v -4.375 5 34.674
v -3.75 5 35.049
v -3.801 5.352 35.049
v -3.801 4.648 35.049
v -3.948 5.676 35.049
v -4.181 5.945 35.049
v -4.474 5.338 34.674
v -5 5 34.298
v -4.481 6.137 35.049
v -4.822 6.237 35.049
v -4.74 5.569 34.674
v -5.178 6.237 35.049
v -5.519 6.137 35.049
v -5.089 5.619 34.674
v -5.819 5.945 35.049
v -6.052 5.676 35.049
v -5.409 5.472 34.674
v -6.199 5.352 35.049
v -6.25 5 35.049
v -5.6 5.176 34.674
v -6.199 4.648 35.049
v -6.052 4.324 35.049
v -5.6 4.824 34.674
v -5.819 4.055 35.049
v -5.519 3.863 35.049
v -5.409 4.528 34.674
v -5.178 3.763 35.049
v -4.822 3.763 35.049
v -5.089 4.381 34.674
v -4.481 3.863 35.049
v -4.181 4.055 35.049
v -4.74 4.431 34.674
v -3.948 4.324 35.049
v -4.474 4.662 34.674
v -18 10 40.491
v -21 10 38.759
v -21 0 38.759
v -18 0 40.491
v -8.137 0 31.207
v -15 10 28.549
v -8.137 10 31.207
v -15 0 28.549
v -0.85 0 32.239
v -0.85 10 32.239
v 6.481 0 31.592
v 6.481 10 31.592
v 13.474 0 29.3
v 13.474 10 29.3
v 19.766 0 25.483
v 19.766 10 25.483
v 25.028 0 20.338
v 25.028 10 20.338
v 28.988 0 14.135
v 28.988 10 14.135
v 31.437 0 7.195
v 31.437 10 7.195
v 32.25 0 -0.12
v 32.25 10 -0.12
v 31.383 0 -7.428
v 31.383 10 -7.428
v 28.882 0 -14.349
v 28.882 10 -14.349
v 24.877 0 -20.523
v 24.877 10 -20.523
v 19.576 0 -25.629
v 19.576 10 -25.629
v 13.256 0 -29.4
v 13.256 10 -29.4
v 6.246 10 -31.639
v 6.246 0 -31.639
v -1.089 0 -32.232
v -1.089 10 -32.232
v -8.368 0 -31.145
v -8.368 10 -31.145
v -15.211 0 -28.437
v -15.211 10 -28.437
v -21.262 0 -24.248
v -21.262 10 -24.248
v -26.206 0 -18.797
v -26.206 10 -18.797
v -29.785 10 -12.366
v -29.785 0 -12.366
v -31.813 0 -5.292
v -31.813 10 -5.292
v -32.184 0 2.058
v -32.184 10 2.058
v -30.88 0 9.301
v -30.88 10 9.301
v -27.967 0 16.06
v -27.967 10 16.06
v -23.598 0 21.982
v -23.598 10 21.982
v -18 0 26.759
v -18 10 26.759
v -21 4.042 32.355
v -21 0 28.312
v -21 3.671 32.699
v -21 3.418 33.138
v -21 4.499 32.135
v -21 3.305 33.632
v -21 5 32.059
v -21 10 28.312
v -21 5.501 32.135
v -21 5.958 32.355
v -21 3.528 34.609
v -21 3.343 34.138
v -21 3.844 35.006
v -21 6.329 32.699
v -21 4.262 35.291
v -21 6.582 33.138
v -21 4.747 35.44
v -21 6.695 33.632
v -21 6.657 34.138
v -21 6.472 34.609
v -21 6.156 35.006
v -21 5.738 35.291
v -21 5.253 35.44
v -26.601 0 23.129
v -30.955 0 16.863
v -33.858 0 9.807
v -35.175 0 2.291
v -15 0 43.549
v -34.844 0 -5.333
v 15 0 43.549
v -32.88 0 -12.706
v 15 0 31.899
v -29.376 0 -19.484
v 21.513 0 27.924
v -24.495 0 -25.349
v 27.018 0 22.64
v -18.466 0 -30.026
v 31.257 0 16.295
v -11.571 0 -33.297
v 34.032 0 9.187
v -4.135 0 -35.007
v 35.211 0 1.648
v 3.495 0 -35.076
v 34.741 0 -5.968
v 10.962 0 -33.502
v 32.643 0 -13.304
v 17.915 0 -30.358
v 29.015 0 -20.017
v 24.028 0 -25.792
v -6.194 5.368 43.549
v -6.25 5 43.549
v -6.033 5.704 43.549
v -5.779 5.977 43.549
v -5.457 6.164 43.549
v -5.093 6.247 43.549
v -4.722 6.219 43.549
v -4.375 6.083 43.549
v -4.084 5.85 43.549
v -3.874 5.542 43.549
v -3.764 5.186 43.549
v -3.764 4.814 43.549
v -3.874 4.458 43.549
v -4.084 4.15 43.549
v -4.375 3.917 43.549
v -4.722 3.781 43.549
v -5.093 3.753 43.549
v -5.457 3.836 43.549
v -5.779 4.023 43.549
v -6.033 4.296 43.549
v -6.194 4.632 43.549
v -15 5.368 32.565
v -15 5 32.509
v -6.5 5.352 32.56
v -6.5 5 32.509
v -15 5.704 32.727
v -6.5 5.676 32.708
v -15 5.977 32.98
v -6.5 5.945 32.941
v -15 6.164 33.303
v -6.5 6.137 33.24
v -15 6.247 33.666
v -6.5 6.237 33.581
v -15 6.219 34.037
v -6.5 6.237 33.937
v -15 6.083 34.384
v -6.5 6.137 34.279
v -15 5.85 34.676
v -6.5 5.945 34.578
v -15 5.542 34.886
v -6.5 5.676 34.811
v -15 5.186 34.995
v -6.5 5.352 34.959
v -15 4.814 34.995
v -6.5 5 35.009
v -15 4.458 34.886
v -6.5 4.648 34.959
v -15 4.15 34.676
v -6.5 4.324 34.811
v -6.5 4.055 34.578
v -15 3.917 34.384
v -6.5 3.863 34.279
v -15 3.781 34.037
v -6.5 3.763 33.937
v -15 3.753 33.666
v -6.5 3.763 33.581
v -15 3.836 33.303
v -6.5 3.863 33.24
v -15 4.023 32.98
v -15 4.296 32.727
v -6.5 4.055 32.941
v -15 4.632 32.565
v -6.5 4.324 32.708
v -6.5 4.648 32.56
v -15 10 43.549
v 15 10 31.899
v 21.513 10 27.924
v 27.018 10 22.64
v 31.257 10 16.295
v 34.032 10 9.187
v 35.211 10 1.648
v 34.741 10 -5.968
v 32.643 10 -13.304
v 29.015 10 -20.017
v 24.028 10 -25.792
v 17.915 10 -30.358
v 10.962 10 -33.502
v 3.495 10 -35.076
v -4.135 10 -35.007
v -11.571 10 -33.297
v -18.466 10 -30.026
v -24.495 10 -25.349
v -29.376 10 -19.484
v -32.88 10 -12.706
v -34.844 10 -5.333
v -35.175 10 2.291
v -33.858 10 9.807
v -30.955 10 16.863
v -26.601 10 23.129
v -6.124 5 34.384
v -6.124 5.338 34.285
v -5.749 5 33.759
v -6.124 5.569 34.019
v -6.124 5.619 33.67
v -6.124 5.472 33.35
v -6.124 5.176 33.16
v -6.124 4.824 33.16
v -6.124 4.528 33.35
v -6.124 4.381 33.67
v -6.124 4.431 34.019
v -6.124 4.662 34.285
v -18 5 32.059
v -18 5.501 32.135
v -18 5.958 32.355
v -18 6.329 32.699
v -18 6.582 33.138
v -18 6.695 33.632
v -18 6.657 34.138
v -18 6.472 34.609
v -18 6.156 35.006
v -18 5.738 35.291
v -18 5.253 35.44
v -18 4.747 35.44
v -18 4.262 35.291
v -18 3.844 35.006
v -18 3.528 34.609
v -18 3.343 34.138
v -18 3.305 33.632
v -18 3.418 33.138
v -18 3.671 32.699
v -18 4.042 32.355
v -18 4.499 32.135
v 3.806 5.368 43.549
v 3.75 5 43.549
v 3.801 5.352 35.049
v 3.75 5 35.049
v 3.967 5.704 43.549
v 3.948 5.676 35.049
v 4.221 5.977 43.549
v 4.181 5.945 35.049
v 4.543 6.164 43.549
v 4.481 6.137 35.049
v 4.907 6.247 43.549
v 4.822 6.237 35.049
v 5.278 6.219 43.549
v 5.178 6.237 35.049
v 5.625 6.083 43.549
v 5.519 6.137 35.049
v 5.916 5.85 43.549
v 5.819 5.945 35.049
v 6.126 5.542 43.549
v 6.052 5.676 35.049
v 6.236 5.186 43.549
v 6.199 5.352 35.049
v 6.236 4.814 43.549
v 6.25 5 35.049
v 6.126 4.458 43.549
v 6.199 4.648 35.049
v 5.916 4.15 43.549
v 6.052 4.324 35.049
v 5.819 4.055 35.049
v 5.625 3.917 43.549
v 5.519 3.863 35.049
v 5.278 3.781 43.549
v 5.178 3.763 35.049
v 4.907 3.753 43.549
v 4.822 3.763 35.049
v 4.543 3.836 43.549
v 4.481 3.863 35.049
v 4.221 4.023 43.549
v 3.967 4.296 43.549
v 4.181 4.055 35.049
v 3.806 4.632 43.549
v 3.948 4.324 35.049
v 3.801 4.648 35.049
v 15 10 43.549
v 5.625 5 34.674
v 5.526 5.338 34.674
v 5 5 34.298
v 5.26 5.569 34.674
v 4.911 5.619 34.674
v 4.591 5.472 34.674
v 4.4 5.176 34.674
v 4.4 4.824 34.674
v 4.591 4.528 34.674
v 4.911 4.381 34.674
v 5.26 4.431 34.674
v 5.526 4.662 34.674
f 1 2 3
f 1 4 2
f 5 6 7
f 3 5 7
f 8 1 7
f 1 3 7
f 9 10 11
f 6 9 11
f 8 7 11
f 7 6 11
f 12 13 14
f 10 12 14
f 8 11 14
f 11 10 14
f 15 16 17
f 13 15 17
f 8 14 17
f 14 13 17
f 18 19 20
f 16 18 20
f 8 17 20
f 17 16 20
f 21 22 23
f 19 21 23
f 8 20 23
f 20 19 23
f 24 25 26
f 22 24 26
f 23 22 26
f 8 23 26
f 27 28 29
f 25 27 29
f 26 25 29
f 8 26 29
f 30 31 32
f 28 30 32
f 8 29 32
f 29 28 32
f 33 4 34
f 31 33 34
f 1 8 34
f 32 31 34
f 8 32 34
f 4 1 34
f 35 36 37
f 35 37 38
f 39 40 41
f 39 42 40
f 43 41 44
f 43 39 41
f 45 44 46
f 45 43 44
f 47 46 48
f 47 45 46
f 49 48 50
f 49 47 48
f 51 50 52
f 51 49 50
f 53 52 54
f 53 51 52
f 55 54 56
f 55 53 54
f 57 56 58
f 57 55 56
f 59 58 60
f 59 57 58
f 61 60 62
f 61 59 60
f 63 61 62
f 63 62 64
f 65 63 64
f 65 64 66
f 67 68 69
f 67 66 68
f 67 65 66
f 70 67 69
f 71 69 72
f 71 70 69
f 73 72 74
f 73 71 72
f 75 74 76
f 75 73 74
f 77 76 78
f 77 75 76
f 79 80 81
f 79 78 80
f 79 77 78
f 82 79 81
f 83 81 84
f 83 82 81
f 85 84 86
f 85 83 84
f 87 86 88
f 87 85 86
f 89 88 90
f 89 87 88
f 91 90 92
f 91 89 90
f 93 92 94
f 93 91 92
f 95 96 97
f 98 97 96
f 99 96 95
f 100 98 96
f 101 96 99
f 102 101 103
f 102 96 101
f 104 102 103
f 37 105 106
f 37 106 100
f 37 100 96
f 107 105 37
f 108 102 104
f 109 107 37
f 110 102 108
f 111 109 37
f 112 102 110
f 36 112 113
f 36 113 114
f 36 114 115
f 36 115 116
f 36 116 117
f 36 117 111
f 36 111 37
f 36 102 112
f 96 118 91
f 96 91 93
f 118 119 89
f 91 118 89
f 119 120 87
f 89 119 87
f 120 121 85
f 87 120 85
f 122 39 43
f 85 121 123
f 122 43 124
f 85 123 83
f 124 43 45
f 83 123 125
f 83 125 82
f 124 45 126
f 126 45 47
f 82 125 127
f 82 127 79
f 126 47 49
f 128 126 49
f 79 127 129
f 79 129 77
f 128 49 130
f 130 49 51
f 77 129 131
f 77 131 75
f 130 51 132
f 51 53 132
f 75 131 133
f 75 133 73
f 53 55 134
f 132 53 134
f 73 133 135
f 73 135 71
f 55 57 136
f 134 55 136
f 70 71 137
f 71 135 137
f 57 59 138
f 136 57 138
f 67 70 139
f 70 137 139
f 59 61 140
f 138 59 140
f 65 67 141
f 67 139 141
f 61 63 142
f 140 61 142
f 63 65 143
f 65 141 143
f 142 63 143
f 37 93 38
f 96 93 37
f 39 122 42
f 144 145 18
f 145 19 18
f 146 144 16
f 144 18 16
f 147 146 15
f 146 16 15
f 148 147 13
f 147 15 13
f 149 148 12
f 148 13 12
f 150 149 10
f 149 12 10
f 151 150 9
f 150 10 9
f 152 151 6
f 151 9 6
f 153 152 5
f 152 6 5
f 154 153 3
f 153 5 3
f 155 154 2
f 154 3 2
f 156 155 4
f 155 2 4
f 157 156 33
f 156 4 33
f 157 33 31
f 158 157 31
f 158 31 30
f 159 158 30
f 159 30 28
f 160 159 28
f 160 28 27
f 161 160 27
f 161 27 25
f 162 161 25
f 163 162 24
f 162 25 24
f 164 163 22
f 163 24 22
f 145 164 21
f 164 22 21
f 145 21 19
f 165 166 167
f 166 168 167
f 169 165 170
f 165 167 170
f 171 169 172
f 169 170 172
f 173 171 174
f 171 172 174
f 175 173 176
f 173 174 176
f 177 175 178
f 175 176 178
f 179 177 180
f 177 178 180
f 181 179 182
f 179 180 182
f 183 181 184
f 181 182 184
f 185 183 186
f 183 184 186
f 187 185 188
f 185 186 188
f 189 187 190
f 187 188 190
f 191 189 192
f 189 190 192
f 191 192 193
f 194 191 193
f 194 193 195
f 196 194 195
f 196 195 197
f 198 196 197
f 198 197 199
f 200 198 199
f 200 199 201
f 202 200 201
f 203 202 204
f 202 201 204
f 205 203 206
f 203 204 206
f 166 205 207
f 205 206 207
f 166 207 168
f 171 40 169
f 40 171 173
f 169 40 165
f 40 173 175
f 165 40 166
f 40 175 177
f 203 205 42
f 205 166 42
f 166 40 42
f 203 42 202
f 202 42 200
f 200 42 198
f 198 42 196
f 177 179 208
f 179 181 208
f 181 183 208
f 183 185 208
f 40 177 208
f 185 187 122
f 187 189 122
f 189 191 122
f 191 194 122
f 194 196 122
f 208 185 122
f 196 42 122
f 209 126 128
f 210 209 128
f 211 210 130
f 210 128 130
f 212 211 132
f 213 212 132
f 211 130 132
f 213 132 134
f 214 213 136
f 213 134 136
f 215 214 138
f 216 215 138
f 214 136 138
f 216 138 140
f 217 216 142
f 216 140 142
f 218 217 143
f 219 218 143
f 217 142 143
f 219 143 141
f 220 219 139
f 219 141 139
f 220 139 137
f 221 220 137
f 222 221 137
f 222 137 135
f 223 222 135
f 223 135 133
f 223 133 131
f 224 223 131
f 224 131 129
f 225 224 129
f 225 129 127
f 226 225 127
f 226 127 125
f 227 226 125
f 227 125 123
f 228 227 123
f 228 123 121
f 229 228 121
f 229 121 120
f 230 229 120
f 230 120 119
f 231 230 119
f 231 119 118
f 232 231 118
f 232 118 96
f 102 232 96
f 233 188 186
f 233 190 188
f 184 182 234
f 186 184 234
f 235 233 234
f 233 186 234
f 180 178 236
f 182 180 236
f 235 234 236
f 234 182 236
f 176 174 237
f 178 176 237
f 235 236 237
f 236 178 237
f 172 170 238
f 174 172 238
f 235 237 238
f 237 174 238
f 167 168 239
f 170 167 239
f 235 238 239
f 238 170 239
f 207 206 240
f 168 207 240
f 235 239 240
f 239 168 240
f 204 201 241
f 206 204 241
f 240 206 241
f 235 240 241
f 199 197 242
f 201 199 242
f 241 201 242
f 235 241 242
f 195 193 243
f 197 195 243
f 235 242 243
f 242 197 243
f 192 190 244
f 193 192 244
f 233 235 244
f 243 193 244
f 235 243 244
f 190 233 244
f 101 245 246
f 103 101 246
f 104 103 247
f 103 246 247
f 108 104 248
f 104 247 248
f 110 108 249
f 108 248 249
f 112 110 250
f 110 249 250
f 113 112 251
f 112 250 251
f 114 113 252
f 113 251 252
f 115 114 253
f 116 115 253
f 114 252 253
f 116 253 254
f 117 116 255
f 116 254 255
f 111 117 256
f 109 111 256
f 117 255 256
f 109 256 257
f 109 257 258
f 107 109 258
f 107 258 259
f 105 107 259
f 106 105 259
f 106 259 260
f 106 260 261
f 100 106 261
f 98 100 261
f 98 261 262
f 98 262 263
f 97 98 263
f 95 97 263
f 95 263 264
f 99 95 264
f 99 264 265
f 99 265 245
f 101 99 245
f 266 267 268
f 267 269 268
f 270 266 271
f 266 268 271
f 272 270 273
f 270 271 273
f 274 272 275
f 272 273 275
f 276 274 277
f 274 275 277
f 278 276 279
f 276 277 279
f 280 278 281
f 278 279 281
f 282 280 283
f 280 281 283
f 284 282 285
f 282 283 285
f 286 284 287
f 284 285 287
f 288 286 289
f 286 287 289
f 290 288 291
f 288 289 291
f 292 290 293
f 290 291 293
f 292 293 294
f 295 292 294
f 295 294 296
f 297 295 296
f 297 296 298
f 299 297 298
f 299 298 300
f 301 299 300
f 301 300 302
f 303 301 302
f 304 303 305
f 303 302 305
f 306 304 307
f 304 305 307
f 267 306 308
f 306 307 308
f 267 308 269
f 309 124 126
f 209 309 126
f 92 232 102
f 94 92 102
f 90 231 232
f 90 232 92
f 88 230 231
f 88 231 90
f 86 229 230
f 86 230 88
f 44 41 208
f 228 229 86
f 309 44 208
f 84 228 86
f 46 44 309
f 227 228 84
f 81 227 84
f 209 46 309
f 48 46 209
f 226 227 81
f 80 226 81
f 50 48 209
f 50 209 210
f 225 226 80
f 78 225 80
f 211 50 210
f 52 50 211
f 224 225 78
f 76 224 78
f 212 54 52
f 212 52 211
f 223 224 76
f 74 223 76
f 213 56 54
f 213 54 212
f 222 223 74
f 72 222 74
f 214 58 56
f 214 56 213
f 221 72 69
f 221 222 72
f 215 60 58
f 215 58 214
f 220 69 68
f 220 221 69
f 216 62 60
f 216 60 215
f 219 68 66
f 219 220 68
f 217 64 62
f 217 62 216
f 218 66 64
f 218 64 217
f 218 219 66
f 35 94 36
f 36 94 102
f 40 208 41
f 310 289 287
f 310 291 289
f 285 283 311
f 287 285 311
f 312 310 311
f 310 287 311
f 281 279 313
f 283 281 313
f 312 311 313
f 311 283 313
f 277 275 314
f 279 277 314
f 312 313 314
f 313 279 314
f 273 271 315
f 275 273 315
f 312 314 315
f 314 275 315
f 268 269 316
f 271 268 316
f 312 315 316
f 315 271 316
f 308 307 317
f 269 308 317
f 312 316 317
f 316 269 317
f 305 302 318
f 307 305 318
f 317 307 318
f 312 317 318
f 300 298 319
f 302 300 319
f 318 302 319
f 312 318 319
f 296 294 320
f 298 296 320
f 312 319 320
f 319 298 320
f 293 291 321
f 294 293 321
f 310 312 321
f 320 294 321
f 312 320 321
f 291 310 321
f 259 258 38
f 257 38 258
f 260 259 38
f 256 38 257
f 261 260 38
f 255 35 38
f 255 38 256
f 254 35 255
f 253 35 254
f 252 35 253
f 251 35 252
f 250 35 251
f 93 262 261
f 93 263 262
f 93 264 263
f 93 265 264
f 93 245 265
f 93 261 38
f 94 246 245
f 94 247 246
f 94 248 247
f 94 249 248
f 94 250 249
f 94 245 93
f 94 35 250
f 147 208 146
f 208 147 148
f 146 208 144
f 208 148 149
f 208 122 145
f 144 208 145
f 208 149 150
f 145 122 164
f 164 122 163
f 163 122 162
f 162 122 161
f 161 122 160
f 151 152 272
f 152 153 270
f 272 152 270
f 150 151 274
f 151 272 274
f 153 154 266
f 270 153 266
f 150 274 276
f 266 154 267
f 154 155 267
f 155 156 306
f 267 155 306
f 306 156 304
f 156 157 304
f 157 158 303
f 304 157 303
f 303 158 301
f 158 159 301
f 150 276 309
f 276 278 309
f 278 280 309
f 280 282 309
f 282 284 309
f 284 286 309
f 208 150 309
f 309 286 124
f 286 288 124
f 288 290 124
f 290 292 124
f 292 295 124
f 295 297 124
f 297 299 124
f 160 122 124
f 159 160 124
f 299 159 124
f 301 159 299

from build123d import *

# Parameters (mm, degrees)
SKETCH_1_R            = 32.25
EXTRUDE_1_DEPTH       = 10
SKETCH_4_W            = 3
SKETCH_4_H            = 8.186725545
CUT_EXTRUDE_2_DEPTH   = 10
EXTRUDE_5_DEPTH       = 10
HOLE_WIZARD_M32_D     = 3.4
HOLE_WIZARD_M32_DEPTH = 3
M3X0_51_D             = 2.5
M3X0_51_DEPTH         = 8.5
M3X0_51_TIP           = 0.751075774
M3X0_52_D             = 2.5
M3X0_52_DEPTH         = 8.5
M3X0_52_TIP           = 0.751075774


with BuildPart() as part:
    # Эскиз1 → Бобышка-Вытянуть1 (new body)
    with BuildSketch(Plane(origin=(0, 0, 0), x_dir=(1, 0, 0), z_dir=(0, 1, 0))):
        with BuildLine():
            Line((-15, -31.899255477), (-15, -43.549299466))
            Line((-15, -43.549299466), (15, -43.549299466))
            Line((15, -43.549299466), (15, -31.899255477))
            ThreePointArc((15, -31.899255477), (0, 35.25), (-15, -31.899255477))
        make_face()
        with Locations(Location((0, 0, 0), (0, 0, 270))):
            Circle(SKETCH_1_R, mode=Mode.SUBTRACT)
    extrude(amount=EXTRUDE_1_DEPTH)

    # Эскиз4 → Вырез-Вытянуть2 (cut)
    with BuildSketch(Plane(origin=(0, 10, 0), x_dir=(1, 0, 0), z_dir=(0, 1, 0))):
        with Locations((-16.5, -27.805892705)):
            Rectangle(SKETCH_4_W, SKETCH_4_H)
    extrude(amount=-CUT_EXTRUDE_2_DEPTH, mode=Mode.SUBTRACT)

    # Эскиз11 → Бобышка-Вытянуть5 (add)
    with BuildSketch(Plane(origin=(0, 10, 0), x_dir=(1, 0, 0), z_dir=(0, 1, 0))):
        Polygon((-18, -26.759344162), (-21, -26.759344162), (-21, -38.759344162), (-18, -40.49139497), align=None)
    extrude(amount=-EXTRUDE_5_DEPTH)

    # Отверстие с зазором M32
    with Locations(Plane.ZY.offset(21)):
        with Locations((33.759344162, 5)):
            Hole(HOLE_WIZARD_M32_D / 2, depth=HOLE_WIZARD_M32_DEPTH)

    # Отверстие обработанное метчиком M3x0.51
    with Locations(Plane.ZY.offset(15)):
        with Locations((33.759344162, 5)):
            Hole(M3X0_51_D / 2, depth=M3X0_51_DEPTH)
            with Locations((0, 0, -(M3X0_51_DEPTH + M3X0_51_TIP / 2))):  # 118° drill point
                Cone(0, M3X0_51_D / 2, M3X0_51_TIP, mode=Mode.SUBTRACT)

    # Отверстие обработанное метчиком M3x0.52
    with Locations(Plane.XY.offset(43.549299466)):
        with Locations((-5, 5), (5, 5)):
            Hole(M3X0_52_D / 2, depth=M3X0_52_DEPTH)
            with Locations((0, 0, -(M3X0_52_DEPTH + M3X0_52_TIP / 2))):  # 118° drill point
                Cone(0, M3X0_52_D / 2, M3X0_52_TIP, mode=Mode.SUBTRACT)


solid = part.part
